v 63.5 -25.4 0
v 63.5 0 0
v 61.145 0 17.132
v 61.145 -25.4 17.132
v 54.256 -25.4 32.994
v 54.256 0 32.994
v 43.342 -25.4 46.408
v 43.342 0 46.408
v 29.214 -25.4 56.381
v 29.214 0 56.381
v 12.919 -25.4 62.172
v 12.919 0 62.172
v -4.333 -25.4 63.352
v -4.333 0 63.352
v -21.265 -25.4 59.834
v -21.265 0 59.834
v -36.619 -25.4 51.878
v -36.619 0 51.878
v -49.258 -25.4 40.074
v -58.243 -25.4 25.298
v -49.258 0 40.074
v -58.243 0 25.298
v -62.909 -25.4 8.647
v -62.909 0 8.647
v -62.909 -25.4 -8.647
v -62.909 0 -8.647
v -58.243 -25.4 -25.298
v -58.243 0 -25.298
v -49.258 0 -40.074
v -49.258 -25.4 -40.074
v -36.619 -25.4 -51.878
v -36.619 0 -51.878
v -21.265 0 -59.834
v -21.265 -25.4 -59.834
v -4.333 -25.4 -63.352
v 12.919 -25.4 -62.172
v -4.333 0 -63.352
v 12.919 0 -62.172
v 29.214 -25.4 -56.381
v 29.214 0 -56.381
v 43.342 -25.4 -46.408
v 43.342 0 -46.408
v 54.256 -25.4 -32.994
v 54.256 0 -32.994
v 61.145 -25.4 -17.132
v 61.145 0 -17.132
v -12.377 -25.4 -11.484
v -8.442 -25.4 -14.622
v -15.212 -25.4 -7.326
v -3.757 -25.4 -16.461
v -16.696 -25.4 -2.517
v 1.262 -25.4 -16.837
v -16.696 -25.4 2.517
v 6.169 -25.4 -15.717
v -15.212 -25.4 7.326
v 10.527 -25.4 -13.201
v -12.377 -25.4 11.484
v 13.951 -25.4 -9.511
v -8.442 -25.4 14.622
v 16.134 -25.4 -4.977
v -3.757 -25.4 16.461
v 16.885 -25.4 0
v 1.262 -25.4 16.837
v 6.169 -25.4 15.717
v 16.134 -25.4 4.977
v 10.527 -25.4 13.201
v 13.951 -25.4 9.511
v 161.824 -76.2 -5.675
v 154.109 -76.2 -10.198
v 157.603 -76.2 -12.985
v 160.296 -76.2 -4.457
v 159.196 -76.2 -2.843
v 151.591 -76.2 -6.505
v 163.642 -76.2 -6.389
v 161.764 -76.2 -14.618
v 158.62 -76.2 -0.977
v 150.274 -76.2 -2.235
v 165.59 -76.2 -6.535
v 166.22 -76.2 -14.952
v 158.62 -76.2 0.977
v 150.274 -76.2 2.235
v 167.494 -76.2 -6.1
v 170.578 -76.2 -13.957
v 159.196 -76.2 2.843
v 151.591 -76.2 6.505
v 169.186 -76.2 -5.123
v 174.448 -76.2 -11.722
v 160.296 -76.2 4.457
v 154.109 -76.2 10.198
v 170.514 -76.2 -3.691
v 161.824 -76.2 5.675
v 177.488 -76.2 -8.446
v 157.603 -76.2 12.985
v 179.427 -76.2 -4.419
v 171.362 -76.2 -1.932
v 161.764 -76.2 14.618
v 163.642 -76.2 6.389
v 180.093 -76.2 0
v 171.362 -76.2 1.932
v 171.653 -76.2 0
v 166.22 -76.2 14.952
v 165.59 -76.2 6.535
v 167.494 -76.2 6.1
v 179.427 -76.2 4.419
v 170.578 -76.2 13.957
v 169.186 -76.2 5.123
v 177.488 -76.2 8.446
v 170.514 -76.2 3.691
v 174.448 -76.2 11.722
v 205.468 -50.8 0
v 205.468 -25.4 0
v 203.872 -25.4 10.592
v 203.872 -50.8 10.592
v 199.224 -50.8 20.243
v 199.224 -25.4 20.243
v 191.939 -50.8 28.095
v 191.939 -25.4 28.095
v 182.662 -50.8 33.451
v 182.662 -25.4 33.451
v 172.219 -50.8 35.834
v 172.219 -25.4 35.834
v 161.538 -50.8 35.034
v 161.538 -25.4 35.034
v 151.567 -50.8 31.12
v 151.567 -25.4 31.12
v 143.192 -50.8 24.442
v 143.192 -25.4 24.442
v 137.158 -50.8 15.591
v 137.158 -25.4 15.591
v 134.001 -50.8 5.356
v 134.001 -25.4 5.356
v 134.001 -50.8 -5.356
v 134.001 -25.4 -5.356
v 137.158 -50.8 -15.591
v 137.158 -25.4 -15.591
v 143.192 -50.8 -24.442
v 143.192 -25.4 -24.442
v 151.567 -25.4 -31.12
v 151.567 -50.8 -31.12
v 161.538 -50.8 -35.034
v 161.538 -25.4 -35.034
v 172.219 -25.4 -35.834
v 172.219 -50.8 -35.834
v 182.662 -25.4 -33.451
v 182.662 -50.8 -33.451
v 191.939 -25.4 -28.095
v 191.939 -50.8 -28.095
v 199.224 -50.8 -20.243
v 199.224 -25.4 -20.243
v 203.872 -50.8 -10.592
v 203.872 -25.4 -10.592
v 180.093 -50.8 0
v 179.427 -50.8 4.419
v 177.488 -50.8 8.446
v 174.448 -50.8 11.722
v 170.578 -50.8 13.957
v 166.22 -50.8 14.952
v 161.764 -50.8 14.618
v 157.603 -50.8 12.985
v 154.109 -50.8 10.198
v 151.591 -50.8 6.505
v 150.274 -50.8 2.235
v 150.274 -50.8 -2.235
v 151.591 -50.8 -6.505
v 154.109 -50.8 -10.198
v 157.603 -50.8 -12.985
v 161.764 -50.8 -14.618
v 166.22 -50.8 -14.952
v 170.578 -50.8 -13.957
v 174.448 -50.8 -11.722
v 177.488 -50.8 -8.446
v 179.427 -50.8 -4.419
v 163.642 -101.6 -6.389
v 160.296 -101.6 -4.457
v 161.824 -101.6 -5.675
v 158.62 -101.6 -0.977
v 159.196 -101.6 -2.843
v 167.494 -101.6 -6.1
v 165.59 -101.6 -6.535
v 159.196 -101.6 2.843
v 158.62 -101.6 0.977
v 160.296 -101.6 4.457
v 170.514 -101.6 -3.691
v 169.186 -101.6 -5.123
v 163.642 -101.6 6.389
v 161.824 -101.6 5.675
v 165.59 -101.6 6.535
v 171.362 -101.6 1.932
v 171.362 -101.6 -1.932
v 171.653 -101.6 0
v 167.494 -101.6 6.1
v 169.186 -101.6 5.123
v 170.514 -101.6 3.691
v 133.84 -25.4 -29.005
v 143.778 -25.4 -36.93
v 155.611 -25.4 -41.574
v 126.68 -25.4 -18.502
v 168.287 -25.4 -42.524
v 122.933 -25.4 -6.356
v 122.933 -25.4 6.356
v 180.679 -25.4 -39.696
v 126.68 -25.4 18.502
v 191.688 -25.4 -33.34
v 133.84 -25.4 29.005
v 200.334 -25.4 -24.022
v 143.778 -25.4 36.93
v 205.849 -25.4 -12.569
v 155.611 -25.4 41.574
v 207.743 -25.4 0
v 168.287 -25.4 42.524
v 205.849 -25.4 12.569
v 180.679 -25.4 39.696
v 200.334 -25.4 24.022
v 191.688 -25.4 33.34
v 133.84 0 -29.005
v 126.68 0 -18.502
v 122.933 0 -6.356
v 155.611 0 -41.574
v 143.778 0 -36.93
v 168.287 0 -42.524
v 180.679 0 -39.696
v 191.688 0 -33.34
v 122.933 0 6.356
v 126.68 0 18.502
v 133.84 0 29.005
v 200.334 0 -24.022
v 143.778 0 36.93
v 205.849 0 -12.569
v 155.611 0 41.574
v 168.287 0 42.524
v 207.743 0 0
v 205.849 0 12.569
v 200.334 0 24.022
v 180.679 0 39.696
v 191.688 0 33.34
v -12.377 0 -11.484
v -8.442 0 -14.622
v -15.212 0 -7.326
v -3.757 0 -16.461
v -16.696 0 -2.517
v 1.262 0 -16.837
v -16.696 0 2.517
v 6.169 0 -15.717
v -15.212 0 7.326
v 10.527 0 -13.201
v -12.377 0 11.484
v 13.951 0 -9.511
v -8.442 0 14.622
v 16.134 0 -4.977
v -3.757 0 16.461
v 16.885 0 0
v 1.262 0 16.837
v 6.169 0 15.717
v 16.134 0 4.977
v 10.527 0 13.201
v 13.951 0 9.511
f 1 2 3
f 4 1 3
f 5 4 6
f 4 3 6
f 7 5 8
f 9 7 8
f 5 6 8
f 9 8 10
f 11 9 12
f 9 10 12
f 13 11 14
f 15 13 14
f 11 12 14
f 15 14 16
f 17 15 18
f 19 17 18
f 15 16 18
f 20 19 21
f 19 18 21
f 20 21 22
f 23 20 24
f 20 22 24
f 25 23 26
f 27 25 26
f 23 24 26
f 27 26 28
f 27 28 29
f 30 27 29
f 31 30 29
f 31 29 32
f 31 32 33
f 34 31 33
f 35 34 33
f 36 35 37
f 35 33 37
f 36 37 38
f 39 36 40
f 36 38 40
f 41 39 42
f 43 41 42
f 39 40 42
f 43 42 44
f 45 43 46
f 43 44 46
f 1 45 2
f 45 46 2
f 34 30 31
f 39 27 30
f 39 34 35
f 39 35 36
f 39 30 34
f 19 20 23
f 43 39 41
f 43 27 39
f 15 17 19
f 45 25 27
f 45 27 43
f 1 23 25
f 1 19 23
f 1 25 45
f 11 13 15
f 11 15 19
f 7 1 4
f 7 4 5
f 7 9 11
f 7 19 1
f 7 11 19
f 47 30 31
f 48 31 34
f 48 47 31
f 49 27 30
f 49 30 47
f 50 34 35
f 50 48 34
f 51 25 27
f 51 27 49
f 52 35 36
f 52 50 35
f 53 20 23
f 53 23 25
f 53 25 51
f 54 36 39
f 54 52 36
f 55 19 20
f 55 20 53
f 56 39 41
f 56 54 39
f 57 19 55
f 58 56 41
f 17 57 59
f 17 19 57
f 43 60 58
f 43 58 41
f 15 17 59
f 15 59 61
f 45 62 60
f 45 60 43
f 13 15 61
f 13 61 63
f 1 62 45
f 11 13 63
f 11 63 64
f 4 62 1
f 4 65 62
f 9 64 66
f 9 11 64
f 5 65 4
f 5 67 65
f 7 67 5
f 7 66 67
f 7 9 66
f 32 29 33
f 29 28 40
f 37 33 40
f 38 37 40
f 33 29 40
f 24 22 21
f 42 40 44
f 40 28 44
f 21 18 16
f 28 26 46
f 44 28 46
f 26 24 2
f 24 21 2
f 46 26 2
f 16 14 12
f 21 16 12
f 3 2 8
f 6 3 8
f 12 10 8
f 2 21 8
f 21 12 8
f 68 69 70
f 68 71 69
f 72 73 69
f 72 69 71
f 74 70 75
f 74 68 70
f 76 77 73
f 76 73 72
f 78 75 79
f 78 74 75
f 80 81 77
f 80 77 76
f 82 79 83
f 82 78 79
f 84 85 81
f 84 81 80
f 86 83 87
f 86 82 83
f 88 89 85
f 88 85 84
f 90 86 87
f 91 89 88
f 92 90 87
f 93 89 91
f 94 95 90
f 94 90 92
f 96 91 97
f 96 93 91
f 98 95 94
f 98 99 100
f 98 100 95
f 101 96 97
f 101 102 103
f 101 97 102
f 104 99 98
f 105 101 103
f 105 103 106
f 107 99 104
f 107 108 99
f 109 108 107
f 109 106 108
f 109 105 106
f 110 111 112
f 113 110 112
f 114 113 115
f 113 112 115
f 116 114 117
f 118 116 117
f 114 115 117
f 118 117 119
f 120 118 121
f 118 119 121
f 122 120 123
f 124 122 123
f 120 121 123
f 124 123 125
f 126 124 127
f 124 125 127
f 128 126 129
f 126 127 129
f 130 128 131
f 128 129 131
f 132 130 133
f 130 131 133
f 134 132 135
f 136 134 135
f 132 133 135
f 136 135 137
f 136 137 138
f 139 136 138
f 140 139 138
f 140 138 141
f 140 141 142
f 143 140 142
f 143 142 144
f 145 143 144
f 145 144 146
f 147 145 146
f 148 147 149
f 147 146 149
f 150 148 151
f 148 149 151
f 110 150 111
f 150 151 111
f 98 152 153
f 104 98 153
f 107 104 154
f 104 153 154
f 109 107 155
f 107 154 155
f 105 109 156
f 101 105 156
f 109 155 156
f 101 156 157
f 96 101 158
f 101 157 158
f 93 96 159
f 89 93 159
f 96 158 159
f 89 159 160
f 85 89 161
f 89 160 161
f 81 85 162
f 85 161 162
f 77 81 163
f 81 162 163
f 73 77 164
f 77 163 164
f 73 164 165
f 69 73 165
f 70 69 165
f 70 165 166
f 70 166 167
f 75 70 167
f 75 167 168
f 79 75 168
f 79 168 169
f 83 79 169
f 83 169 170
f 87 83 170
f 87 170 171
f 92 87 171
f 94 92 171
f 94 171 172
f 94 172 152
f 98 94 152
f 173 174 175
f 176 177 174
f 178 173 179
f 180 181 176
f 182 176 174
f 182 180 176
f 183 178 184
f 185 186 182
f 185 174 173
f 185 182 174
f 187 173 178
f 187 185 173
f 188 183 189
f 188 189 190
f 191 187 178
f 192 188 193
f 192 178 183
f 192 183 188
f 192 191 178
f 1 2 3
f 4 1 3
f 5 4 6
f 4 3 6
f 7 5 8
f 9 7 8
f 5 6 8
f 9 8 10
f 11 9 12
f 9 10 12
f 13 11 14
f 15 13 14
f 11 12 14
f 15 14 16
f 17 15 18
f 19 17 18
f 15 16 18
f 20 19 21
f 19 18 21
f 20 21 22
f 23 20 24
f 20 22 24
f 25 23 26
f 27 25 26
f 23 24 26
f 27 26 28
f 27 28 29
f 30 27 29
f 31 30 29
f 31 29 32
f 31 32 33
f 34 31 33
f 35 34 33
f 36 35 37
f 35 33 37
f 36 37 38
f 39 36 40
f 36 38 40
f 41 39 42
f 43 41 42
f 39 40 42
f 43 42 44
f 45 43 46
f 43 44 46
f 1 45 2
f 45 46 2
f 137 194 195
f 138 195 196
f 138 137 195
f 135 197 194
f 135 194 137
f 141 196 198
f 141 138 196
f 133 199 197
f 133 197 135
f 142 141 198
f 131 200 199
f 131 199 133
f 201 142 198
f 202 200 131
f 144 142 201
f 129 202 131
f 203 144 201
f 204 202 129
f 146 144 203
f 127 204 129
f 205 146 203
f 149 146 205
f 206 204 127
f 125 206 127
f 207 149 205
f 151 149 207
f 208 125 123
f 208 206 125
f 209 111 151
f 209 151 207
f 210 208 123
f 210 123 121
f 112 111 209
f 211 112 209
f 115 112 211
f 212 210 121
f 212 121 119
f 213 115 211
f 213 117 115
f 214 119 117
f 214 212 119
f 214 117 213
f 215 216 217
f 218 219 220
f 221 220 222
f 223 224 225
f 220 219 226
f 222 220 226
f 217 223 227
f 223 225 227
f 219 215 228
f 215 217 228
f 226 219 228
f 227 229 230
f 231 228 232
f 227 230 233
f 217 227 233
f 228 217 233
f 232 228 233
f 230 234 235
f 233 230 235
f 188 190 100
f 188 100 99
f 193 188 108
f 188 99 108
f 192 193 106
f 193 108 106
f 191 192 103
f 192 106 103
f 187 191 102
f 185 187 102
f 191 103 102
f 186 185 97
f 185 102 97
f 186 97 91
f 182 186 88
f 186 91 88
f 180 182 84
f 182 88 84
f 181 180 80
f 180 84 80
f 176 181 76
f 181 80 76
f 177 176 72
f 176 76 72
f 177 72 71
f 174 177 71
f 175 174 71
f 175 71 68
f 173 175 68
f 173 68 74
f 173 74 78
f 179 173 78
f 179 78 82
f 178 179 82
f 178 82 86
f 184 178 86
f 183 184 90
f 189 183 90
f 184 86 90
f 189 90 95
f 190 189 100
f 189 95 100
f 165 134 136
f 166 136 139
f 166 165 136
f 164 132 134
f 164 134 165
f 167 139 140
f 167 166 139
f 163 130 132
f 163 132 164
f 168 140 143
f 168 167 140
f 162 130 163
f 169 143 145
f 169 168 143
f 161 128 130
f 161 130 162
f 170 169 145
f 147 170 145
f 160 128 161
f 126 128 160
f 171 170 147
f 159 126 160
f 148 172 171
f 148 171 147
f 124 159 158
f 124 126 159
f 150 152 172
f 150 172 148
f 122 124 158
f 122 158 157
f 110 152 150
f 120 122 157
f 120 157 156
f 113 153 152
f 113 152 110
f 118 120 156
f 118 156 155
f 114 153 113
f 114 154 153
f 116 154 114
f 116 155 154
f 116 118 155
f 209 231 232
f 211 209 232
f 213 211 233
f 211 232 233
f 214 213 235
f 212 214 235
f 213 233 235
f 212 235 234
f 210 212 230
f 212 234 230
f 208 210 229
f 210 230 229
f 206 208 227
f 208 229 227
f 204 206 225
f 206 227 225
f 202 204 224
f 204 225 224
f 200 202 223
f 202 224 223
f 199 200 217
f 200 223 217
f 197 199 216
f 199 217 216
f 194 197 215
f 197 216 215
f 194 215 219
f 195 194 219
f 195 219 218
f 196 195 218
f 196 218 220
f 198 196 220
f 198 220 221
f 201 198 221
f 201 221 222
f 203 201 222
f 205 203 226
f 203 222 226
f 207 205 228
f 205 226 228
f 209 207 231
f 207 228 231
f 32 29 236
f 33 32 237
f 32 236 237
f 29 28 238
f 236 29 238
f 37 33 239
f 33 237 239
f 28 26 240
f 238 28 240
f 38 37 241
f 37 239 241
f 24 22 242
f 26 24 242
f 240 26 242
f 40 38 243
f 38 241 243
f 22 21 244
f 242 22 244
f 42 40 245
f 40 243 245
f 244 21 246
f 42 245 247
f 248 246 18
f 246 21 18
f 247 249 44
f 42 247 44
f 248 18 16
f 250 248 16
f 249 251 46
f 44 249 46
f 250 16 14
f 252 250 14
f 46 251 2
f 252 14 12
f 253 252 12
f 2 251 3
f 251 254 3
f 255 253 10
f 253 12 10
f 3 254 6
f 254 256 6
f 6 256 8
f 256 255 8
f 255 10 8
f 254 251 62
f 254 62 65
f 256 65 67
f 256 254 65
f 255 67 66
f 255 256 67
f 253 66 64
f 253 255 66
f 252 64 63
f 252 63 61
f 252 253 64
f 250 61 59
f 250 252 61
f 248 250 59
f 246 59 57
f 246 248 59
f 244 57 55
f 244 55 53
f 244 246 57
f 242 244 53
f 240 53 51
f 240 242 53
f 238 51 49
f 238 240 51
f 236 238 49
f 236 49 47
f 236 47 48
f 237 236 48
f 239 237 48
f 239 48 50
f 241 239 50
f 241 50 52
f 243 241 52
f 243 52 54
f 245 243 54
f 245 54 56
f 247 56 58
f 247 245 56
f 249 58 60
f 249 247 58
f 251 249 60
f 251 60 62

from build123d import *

# Parameters (mm, degrees)
F0_R     = 42.6433885457
F2_DEPTH = 25.4
F0_R_2   = 63.5
F1_R     = 63.5
F1_R_2   = 16.8845262582
F3_R     = 35.9345767258
F3_R_2   = 14.9934405288
F4_DEPTH = 25.4
F5_DEPTH = 50.8
F6_R     = 6.5529414014
F7_DEPTH = 25.4


with BuildPart() as f2:
    # F0 (on Front) → F2 (new body)
    with BuildSketch(Plane.XZ):
        with Locations((165.1, 0)):
            Circle(F0_R)
    extrude(amount=F2_DEPTH)

    # F3 (on face) → F4 (join)
    with BuildSketch(Plane.XZ.offset(25.4)):
        with Locations((169.5338785648, 0)):
            Circle(F3_R)
        with Locations((165.1, 0)):
            Circle(F3_R_2, mode=Mode.SUBTRACT)
    extrude(amount=F4_DEPTH)

    # F5 (add): a face of the model
    f5_faces = [f2.faces().sort_by_distance(p)[0] for p in [
        (165.1, -25.4, 0),
    ]]
    extrude(f5_faces, amount=F5_DEPTH)

    # F6 (on face) → F7 (join)
    with BuildSketch(Plane.XZ.offset(76.2)):
        with Locations((165.1, 0)):
            Circle(F6_R)
    extrude(amount=F7_DEPTH)


with BuildPart() as f2b:
    # F0 (on Front) → F2, piece 2 (new body)
    with BuildSketch(Plane.XZ):
        Circle(F0_R_2)
    extrude(amount=F2_DEPTH)


with BuildPart() as f2c:
    # F1 (on face) → F2, piece 3 (new body)
    with BuildSketch(Plane.XZ):
        Circle(F1_R)
        Circle(F1_R_2, mode=Mode.SUBTRACT)
    extrude(amount=F2_DEPTH)


solid = Compound([f2.part, f2b.part, f2c.part])
